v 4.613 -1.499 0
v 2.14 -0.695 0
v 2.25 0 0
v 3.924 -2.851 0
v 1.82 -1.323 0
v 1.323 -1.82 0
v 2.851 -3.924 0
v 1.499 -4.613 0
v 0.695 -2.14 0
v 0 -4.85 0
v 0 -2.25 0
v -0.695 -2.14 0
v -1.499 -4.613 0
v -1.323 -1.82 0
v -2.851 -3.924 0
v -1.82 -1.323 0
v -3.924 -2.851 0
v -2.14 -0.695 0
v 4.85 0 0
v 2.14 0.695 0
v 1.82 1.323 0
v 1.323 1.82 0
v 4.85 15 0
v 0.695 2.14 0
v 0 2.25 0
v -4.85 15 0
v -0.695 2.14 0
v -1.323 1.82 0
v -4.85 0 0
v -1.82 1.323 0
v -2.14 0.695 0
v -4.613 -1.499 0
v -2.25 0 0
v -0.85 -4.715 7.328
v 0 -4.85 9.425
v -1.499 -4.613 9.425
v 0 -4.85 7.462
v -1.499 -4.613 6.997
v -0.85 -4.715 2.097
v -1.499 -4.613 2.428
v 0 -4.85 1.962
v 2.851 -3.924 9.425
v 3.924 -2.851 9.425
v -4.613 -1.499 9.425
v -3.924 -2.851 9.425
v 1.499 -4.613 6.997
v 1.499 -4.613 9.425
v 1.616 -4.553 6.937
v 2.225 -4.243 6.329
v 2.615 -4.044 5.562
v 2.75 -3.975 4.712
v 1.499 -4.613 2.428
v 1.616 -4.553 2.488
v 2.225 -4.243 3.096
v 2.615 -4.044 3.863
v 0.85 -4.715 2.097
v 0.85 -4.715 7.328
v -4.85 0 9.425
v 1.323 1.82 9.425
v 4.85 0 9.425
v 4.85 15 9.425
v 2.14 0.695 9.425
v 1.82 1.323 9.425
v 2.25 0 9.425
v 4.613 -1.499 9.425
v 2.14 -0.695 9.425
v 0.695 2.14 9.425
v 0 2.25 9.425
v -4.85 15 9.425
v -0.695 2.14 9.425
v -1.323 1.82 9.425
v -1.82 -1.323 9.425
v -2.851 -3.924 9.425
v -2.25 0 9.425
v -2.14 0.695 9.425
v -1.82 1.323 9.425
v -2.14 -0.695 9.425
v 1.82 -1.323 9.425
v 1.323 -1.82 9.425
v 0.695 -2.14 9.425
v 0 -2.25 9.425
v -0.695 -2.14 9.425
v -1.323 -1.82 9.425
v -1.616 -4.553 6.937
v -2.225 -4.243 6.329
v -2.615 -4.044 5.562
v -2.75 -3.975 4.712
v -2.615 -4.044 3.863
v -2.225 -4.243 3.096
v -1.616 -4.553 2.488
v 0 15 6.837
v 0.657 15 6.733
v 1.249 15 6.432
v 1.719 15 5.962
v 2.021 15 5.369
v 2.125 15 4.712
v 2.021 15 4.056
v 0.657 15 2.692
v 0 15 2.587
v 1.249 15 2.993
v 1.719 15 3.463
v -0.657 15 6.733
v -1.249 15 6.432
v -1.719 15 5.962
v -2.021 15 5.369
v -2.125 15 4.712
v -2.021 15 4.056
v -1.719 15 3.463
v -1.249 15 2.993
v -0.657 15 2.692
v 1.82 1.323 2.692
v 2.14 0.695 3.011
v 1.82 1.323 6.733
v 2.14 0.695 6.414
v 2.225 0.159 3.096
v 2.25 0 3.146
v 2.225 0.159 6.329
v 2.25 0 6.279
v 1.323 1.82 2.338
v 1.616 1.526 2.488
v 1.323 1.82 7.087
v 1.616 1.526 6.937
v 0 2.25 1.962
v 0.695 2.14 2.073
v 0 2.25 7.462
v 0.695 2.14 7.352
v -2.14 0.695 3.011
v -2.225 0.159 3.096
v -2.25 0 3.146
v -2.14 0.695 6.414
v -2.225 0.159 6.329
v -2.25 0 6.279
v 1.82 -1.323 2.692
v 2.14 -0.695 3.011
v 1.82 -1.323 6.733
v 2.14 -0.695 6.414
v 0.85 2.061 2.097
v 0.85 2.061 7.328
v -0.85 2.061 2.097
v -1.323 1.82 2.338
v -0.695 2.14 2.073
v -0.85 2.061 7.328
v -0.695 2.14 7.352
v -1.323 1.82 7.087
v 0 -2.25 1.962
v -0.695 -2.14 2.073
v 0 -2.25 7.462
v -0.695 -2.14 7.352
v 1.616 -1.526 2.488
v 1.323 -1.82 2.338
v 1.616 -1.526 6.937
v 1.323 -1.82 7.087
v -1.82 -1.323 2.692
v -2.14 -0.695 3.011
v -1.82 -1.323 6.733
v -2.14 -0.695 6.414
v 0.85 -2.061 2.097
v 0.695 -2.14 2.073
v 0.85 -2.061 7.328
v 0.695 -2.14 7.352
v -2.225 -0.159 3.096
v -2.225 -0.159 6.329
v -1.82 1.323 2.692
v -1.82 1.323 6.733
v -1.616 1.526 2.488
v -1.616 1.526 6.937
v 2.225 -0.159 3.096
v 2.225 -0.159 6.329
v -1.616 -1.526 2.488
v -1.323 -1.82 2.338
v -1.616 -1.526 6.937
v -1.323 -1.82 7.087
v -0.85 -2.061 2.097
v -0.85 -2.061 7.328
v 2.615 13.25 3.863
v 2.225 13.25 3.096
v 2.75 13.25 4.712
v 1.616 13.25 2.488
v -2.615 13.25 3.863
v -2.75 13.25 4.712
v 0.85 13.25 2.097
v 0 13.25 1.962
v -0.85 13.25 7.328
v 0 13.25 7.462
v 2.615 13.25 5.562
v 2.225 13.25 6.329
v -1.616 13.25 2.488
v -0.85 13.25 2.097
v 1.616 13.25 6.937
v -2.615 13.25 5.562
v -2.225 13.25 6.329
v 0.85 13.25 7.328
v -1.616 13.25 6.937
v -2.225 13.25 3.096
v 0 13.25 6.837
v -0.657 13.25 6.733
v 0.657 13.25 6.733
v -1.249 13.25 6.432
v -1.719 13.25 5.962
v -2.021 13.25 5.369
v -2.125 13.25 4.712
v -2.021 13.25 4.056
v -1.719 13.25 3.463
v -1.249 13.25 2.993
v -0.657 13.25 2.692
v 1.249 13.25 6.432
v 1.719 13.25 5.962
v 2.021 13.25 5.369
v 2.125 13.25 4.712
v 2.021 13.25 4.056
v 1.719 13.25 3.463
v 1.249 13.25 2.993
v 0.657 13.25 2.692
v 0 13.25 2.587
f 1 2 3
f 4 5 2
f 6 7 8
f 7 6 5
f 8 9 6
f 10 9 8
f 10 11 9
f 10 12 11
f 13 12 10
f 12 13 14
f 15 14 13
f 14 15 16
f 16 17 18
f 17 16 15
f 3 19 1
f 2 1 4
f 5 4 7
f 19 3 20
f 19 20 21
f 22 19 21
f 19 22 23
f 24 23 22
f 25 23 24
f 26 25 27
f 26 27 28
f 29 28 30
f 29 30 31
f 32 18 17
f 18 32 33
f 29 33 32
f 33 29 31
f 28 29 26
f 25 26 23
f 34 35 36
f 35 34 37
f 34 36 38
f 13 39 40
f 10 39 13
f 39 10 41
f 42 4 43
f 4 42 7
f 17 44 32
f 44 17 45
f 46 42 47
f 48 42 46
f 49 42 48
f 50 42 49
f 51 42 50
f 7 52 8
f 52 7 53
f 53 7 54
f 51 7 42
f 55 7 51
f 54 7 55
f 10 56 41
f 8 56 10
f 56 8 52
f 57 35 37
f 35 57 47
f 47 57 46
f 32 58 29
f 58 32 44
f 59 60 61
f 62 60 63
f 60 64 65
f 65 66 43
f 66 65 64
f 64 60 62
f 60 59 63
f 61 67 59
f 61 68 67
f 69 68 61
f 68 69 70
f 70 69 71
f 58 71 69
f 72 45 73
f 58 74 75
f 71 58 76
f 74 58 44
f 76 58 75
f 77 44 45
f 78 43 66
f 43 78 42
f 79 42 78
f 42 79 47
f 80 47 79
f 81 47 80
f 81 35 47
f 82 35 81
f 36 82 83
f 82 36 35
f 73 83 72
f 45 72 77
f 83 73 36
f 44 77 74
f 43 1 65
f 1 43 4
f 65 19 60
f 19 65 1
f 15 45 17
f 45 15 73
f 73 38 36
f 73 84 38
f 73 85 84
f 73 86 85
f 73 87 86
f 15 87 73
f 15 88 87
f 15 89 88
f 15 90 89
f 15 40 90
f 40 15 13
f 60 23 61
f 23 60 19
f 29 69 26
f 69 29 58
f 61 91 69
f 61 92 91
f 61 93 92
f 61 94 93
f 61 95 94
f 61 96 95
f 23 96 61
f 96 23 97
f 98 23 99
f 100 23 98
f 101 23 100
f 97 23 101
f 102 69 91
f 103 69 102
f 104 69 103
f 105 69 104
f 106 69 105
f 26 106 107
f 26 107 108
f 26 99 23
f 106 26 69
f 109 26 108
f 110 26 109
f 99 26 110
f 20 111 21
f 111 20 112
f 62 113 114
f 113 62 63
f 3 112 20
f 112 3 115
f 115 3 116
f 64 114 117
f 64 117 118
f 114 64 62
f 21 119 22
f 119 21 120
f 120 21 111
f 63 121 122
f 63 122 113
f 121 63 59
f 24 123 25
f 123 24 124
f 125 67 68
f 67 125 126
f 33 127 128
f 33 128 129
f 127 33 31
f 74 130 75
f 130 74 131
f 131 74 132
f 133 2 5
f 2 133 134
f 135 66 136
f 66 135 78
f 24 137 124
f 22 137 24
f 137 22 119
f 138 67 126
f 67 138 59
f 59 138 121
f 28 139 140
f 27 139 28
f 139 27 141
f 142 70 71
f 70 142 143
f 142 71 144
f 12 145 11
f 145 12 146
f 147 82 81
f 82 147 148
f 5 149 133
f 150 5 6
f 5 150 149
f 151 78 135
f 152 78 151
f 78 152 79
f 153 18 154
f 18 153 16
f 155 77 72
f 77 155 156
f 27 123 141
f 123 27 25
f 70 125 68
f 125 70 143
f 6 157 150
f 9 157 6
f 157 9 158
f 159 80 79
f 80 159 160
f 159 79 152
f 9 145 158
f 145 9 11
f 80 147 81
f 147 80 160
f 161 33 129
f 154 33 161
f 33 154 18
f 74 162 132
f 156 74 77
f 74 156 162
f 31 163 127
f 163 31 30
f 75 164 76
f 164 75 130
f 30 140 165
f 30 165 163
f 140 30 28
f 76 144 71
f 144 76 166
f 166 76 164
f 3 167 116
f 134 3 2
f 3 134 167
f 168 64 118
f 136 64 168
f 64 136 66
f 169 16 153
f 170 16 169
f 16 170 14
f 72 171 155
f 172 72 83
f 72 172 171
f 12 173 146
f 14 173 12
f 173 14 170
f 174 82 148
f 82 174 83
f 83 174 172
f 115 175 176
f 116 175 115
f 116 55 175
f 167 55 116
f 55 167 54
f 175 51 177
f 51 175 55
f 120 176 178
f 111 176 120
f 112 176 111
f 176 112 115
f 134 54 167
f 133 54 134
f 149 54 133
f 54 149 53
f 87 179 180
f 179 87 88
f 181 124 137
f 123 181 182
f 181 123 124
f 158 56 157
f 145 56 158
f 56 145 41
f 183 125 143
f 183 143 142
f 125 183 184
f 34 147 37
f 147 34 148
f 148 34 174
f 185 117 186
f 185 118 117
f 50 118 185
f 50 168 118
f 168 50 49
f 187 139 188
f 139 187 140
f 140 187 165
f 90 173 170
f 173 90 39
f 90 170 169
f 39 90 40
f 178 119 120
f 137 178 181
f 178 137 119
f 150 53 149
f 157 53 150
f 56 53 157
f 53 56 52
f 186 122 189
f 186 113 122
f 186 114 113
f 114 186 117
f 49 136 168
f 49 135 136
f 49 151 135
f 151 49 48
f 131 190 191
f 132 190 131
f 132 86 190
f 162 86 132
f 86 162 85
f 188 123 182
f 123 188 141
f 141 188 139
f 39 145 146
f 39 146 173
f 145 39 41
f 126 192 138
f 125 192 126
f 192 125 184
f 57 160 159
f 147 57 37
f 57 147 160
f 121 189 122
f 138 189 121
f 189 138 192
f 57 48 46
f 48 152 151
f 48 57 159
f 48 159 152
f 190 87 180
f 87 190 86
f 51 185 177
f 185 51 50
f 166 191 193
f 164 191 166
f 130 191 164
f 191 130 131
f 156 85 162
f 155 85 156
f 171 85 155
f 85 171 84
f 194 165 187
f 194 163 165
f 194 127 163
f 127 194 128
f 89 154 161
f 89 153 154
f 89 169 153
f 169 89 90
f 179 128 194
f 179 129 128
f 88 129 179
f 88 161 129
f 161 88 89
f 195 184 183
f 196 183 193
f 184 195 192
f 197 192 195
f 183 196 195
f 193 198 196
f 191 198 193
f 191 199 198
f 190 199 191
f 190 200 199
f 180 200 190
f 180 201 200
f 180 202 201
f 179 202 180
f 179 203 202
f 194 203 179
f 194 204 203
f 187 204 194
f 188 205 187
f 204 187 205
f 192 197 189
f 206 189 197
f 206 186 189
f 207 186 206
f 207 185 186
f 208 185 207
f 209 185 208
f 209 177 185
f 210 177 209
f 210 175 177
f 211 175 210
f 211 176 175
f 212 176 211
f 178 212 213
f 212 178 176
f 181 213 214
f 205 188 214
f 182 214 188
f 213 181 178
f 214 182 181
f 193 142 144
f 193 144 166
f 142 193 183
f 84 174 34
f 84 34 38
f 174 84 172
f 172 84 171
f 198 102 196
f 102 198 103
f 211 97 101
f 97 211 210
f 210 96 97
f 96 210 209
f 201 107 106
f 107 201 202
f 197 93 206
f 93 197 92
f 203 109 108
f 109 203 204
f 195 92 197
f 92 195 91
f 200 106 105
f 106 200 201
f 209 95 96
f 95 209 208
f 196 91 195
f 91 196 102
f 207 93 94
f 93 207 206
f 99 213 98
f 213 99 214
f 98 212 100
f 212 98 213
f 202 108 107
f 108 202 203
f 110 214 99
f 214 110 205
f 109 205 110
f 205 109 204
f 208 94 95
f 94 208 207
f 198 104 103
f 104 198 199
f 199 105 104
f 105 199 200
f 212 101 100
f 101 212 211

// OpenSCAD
//Set the wiggle room around things to cope with non-exact prints
wiggle=0.25;

//moving webcam down by 15mm measured from screw
heigt_from_screw=15;

/* [Hidden] */
//----------------------------------------------------------------------------

$fn=20;

thick=9.8-1.5*wiggle;
rotation_free=0.5;
wide=10.7-2*rotation_free;
holedia=4+2*wiggle;
length=wide+1;
height=heigt_from_screw;

wc_screw=5+2*wiggle;
wc_hole=4+wiggle;
wc_wall=1.5+wiggle;

difference()
{
    union()
        {
            cylinder(d=wide,h=thick);
            
            translate([-wide/2,0,0])
                cube([wide,height,thick]);
            
            *hull()
            {
                translate([-wide/2,0,0])
                    cube([wide,0.1,thick]);
                translate([0,height,wide/2])
                    rotate([90,0,0])
                        cylinder(d=wide,h=.5);
            }
        }
        
    translate([0,0,-wiggle])
        cylinder(d=holedia,h=thick+2*wiggle);
        
    //mounting screw hole
    translate([0,-wide/2-wc_wall,thick/2])
        rotate([-90,0,0])
            cylinder(d=wc_screw,h=wide/2+height);
        
    translate([0,-wide/2+1,thick/2])
        rotate([-90,0,0])
            cylinder(d=wc_hole,h=wide/2+height);        
}
